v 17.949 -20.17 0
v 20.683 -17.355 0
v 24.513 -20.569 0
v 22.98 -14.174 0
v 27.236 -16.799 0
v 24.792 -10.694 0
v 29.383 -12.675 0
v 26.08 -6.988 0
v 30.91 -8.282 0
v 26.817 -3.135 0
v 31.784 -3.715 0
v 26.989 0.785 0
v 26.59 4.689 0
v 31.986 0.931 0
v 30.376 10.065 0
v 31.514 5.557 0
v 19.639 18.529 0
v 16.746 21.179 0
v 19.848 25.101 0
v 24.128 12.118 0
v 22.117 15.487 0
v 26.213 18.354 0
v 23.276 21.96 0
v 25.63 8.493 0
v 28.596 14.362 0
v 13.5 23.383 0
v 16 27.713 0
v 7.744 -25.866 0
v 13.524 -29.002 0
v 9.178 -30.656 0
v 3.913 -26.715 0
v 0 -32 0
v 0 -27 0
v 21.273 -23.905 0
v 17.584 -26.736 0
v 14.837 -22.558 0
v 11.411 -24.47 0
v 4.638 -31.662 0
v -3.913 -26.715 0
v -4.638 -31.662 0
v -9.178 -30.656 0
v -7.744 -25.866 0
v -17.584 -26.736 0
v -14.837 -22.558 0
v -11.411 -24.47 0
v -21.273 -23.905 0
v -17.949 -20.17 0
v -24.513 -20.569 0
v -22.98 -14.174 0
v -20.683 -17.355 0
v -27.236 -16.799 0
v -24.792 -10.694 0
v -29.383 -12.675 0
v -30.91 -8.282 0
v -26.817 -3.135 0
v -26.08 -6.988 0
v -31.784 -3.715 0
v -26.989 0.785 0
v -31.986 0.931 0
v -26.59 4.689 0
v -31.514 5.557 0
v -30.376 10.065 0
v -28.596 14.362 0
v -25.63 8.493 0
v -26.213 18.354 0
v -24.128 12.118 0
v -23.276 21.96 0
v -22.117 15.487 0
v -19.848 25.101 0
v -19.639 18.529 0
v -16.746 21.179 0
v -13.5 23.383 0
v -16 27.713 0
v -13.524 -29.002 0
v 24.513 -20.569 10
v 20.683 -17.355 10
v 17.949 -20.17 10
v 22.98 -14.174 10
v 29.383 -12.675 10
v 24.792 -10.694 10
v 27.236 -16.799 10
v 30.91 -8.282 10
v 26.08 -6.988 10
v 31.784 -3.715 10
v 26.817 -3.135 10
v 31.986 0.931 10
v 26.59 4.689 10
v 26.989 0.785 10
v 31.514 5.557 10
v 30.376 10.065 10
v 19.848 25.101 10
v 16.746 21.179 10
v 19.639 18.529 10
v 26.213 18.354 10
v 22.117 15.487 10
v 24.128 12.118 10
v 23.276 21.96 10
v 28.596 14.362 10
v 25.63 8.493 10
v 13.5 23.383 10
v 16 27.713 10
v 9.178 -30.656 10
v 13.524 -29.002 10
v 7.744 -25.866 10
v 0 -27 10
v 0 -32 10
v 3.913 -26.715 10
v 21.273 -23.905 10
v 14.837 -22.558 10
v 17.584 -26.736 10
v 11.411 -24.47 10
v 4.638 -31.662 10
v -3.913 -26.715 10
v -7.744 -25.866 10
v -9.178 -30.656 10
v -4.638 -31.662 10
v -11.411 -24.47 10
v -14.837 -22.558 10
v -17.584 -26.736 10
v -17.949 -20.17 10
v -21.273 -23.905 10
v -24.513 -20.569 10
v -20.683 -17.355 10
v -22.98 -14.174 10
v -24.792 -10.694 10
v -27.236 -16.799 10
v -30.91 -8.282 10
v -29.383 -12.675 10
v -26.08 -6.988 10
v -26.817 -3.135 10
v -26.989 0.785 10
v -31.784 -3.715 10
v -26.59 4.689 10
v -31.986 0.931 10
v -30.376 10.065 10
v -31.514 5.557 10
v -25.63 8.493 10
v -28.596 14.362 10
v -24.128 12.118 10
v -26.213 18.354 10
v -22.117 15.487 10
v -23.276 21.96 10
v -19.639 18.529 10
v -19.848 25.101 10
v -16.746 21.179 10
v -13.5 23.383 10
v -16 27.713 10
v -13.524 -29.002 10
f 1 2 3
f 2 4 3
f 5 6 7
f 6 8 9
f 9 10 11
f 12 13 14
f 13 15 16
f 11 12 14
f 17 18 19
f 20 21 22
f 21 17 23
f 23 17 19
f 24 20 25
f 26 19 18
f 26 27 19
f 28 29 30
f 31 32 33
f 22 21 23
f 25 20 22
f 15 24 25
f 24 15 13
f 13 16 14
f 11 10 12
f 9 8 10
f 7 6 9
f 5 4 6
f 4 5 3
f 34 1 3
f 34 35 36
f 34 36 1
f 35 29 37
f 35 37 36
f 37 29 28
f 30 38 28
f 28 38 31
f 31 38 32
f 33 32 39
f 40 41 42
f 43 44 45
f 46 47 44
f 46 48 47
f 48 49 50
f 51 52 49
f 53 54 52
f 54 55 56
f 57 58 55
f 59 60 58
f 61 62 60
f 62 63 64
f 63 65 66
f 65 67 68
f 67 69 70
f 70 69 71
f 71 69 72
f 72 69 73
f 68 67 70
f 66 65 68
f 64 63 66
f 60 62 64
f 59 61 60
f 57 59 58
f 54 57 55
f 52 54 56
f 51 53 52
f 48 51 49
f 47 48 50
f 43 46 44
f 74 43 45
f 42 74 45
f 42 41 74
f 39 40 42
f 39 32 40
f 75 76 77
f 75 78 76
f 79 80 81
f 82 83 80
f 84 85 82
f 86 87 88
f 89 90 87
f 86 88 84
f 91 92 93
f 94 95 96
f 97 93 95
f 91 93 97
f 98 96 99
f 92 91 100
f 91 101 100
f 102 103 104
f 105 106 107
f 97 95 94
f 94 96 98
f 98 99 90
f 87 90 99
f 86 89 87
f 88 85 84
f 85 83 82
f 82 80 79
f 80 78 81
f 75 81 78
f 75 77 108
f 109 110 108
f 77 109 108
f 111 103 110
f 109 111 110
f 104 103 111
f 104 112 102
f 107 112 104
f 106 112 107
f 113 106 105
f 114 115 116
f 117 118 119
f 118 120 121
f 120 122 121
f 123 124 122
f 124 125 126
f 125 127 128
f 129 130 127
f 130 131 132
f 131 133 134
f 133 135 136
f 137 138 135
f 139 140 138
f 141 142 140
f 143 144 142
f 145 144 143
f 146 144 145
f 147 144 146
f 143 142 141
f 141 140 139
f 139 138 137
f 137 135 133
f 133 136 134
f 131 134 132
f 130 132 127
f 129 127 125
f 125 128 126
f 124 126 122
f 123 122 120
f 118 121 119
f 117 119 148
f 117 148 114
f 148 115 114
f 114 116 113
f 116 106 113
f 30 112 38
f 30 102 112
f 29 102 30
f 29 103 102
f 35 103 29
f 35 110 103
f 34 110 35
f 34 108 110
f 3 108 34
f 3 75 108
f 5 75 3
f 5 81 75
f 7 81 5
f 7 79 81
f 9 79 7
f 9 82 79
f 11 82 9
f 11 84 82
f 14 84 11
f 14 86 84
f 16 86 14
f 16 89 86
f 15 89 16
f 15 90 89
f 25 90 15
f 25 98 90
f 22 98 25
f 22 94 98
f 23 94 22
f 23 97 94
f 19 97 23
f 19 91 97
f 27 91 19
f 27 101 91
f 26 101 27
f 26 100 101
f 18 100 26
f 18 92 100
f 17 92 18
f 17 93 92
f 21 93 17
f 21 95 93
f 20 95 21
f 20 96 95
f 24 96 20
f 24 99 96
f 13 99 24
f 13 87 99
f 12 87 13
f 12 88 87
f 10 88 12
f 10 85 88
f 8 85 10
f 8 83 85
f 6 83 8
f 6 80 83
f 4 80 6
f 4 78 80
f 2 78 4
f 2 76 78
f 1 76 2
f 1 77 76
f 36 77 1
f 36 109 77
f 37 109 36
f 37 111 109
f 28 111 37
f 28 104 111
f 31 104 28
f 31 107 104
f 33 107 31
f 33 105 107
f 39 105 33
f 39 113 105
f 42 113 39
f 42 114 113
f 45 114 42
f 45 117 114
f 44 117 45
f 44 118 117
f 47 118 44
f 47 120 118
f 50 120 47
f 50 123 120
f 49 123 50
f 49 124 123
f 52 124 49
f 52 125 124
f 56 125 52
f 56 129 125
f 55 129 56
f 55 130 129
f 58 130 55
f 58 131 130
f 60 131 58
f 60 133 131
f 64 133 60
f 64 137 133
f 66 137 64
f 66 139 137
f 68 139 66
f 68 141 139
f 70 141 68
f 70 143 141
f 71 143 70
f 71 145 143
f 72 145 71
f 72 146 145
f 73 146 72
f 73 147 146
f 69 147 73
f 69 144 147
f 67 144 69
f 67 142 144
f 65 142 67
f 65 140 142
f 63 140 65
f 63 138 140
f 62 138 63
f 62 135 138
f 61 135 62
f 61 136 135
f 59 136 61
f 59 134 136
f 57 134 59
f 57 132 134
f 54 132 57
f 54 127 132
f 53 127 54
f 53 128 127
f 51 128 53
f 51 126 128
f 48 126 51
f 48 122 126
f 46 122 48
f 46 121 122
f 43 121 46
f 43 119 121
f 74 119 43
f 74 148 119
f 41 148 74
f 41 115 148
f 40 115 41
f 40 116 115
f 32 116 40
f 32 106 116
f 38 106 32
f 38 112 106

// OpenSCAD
$fn = 32;

// ----------------------------------------------------------------------
// Spring clip: 64 mm outside, 5 mm band, 60 degree opening
// ----------------------------------------------------------------------

// --- parameters (mm) ---
outer_r = 32;             // clip outside radius
inner_r = 27;             // clip bore radius
band = 5;                 // band thickness
clip_w = 10;              // clip width
opening = 60;             // opening angle

clip_profile = [[-16, 27.713], [-19.848, 25.101], [-23.276, 21.96], [-26.213, 18.354], [-28.596, 14.362], [-30.376, 10.065], [-31.514, 5.557], [-31.986, 0.931], [-31.784, -3.715], [-30.91, -8.282], [-29.383, -12.675], [-27.236, -16.799], [-24.513, -20.569], [-21.273, -23.905], [-17.584, -26.736], [-13.524, -29.002], [-9.178, -30.656], [-4.638, -31.662], [0, -32], [4.638, -31.662], [9.178, -30.656], [13.524, -29.002], [17.584, -26.736], [21.273, -23.905], [24.513, -20.569], [27.236, -16.799], [29.383, -12.675], [30.91, -8.282], [31.784, -3.715], [31.986, 0.931], [31.514, 5.557], [30.376, 10.065], [28.596, 14.362], [26.213, 18.354], [23.276, 21.96], [19.848, 25.101], [16, 27.713], [13.5, 23.383], [16.746, 21.179], [19.639, 18.529], [22.117, 15.487], [24.128, 12.118], [25.63, 8.493], [26.59, 4.689], [26.989, 0.785], [26.817, -3.135], [26.08, -6.988], [24.792, -10.694], [22.98, -14.174], [20.683, -17.355], [17.949, -20.17], [14.837, -22.558], [11.411, -24.47], [7.744, -25.866], [3.913, -26.715], [0, -27], [-3.913, -26.715], [-7.744, -25.866], [-11.411, -24.47], [-14.837, -22.558], [-17.949, -20.17], [-20.683, -17.355], [-22.98, -14.174], [-24.792, -10.694], [-26.08, -6.988], [-26.817, -3.135], [-26.989, 0.785], [-26.59, 4.689], [-25.63, 8.493], [-24.128, 12.118], [-22.117, 15.487], [-19.639, 18.529], [-16.746, 21.179], [-13.5, 23.383]];

difference() {
  union() {
    linear_extrude(height = clip_w) polygon(clip_profile);
  }
}
